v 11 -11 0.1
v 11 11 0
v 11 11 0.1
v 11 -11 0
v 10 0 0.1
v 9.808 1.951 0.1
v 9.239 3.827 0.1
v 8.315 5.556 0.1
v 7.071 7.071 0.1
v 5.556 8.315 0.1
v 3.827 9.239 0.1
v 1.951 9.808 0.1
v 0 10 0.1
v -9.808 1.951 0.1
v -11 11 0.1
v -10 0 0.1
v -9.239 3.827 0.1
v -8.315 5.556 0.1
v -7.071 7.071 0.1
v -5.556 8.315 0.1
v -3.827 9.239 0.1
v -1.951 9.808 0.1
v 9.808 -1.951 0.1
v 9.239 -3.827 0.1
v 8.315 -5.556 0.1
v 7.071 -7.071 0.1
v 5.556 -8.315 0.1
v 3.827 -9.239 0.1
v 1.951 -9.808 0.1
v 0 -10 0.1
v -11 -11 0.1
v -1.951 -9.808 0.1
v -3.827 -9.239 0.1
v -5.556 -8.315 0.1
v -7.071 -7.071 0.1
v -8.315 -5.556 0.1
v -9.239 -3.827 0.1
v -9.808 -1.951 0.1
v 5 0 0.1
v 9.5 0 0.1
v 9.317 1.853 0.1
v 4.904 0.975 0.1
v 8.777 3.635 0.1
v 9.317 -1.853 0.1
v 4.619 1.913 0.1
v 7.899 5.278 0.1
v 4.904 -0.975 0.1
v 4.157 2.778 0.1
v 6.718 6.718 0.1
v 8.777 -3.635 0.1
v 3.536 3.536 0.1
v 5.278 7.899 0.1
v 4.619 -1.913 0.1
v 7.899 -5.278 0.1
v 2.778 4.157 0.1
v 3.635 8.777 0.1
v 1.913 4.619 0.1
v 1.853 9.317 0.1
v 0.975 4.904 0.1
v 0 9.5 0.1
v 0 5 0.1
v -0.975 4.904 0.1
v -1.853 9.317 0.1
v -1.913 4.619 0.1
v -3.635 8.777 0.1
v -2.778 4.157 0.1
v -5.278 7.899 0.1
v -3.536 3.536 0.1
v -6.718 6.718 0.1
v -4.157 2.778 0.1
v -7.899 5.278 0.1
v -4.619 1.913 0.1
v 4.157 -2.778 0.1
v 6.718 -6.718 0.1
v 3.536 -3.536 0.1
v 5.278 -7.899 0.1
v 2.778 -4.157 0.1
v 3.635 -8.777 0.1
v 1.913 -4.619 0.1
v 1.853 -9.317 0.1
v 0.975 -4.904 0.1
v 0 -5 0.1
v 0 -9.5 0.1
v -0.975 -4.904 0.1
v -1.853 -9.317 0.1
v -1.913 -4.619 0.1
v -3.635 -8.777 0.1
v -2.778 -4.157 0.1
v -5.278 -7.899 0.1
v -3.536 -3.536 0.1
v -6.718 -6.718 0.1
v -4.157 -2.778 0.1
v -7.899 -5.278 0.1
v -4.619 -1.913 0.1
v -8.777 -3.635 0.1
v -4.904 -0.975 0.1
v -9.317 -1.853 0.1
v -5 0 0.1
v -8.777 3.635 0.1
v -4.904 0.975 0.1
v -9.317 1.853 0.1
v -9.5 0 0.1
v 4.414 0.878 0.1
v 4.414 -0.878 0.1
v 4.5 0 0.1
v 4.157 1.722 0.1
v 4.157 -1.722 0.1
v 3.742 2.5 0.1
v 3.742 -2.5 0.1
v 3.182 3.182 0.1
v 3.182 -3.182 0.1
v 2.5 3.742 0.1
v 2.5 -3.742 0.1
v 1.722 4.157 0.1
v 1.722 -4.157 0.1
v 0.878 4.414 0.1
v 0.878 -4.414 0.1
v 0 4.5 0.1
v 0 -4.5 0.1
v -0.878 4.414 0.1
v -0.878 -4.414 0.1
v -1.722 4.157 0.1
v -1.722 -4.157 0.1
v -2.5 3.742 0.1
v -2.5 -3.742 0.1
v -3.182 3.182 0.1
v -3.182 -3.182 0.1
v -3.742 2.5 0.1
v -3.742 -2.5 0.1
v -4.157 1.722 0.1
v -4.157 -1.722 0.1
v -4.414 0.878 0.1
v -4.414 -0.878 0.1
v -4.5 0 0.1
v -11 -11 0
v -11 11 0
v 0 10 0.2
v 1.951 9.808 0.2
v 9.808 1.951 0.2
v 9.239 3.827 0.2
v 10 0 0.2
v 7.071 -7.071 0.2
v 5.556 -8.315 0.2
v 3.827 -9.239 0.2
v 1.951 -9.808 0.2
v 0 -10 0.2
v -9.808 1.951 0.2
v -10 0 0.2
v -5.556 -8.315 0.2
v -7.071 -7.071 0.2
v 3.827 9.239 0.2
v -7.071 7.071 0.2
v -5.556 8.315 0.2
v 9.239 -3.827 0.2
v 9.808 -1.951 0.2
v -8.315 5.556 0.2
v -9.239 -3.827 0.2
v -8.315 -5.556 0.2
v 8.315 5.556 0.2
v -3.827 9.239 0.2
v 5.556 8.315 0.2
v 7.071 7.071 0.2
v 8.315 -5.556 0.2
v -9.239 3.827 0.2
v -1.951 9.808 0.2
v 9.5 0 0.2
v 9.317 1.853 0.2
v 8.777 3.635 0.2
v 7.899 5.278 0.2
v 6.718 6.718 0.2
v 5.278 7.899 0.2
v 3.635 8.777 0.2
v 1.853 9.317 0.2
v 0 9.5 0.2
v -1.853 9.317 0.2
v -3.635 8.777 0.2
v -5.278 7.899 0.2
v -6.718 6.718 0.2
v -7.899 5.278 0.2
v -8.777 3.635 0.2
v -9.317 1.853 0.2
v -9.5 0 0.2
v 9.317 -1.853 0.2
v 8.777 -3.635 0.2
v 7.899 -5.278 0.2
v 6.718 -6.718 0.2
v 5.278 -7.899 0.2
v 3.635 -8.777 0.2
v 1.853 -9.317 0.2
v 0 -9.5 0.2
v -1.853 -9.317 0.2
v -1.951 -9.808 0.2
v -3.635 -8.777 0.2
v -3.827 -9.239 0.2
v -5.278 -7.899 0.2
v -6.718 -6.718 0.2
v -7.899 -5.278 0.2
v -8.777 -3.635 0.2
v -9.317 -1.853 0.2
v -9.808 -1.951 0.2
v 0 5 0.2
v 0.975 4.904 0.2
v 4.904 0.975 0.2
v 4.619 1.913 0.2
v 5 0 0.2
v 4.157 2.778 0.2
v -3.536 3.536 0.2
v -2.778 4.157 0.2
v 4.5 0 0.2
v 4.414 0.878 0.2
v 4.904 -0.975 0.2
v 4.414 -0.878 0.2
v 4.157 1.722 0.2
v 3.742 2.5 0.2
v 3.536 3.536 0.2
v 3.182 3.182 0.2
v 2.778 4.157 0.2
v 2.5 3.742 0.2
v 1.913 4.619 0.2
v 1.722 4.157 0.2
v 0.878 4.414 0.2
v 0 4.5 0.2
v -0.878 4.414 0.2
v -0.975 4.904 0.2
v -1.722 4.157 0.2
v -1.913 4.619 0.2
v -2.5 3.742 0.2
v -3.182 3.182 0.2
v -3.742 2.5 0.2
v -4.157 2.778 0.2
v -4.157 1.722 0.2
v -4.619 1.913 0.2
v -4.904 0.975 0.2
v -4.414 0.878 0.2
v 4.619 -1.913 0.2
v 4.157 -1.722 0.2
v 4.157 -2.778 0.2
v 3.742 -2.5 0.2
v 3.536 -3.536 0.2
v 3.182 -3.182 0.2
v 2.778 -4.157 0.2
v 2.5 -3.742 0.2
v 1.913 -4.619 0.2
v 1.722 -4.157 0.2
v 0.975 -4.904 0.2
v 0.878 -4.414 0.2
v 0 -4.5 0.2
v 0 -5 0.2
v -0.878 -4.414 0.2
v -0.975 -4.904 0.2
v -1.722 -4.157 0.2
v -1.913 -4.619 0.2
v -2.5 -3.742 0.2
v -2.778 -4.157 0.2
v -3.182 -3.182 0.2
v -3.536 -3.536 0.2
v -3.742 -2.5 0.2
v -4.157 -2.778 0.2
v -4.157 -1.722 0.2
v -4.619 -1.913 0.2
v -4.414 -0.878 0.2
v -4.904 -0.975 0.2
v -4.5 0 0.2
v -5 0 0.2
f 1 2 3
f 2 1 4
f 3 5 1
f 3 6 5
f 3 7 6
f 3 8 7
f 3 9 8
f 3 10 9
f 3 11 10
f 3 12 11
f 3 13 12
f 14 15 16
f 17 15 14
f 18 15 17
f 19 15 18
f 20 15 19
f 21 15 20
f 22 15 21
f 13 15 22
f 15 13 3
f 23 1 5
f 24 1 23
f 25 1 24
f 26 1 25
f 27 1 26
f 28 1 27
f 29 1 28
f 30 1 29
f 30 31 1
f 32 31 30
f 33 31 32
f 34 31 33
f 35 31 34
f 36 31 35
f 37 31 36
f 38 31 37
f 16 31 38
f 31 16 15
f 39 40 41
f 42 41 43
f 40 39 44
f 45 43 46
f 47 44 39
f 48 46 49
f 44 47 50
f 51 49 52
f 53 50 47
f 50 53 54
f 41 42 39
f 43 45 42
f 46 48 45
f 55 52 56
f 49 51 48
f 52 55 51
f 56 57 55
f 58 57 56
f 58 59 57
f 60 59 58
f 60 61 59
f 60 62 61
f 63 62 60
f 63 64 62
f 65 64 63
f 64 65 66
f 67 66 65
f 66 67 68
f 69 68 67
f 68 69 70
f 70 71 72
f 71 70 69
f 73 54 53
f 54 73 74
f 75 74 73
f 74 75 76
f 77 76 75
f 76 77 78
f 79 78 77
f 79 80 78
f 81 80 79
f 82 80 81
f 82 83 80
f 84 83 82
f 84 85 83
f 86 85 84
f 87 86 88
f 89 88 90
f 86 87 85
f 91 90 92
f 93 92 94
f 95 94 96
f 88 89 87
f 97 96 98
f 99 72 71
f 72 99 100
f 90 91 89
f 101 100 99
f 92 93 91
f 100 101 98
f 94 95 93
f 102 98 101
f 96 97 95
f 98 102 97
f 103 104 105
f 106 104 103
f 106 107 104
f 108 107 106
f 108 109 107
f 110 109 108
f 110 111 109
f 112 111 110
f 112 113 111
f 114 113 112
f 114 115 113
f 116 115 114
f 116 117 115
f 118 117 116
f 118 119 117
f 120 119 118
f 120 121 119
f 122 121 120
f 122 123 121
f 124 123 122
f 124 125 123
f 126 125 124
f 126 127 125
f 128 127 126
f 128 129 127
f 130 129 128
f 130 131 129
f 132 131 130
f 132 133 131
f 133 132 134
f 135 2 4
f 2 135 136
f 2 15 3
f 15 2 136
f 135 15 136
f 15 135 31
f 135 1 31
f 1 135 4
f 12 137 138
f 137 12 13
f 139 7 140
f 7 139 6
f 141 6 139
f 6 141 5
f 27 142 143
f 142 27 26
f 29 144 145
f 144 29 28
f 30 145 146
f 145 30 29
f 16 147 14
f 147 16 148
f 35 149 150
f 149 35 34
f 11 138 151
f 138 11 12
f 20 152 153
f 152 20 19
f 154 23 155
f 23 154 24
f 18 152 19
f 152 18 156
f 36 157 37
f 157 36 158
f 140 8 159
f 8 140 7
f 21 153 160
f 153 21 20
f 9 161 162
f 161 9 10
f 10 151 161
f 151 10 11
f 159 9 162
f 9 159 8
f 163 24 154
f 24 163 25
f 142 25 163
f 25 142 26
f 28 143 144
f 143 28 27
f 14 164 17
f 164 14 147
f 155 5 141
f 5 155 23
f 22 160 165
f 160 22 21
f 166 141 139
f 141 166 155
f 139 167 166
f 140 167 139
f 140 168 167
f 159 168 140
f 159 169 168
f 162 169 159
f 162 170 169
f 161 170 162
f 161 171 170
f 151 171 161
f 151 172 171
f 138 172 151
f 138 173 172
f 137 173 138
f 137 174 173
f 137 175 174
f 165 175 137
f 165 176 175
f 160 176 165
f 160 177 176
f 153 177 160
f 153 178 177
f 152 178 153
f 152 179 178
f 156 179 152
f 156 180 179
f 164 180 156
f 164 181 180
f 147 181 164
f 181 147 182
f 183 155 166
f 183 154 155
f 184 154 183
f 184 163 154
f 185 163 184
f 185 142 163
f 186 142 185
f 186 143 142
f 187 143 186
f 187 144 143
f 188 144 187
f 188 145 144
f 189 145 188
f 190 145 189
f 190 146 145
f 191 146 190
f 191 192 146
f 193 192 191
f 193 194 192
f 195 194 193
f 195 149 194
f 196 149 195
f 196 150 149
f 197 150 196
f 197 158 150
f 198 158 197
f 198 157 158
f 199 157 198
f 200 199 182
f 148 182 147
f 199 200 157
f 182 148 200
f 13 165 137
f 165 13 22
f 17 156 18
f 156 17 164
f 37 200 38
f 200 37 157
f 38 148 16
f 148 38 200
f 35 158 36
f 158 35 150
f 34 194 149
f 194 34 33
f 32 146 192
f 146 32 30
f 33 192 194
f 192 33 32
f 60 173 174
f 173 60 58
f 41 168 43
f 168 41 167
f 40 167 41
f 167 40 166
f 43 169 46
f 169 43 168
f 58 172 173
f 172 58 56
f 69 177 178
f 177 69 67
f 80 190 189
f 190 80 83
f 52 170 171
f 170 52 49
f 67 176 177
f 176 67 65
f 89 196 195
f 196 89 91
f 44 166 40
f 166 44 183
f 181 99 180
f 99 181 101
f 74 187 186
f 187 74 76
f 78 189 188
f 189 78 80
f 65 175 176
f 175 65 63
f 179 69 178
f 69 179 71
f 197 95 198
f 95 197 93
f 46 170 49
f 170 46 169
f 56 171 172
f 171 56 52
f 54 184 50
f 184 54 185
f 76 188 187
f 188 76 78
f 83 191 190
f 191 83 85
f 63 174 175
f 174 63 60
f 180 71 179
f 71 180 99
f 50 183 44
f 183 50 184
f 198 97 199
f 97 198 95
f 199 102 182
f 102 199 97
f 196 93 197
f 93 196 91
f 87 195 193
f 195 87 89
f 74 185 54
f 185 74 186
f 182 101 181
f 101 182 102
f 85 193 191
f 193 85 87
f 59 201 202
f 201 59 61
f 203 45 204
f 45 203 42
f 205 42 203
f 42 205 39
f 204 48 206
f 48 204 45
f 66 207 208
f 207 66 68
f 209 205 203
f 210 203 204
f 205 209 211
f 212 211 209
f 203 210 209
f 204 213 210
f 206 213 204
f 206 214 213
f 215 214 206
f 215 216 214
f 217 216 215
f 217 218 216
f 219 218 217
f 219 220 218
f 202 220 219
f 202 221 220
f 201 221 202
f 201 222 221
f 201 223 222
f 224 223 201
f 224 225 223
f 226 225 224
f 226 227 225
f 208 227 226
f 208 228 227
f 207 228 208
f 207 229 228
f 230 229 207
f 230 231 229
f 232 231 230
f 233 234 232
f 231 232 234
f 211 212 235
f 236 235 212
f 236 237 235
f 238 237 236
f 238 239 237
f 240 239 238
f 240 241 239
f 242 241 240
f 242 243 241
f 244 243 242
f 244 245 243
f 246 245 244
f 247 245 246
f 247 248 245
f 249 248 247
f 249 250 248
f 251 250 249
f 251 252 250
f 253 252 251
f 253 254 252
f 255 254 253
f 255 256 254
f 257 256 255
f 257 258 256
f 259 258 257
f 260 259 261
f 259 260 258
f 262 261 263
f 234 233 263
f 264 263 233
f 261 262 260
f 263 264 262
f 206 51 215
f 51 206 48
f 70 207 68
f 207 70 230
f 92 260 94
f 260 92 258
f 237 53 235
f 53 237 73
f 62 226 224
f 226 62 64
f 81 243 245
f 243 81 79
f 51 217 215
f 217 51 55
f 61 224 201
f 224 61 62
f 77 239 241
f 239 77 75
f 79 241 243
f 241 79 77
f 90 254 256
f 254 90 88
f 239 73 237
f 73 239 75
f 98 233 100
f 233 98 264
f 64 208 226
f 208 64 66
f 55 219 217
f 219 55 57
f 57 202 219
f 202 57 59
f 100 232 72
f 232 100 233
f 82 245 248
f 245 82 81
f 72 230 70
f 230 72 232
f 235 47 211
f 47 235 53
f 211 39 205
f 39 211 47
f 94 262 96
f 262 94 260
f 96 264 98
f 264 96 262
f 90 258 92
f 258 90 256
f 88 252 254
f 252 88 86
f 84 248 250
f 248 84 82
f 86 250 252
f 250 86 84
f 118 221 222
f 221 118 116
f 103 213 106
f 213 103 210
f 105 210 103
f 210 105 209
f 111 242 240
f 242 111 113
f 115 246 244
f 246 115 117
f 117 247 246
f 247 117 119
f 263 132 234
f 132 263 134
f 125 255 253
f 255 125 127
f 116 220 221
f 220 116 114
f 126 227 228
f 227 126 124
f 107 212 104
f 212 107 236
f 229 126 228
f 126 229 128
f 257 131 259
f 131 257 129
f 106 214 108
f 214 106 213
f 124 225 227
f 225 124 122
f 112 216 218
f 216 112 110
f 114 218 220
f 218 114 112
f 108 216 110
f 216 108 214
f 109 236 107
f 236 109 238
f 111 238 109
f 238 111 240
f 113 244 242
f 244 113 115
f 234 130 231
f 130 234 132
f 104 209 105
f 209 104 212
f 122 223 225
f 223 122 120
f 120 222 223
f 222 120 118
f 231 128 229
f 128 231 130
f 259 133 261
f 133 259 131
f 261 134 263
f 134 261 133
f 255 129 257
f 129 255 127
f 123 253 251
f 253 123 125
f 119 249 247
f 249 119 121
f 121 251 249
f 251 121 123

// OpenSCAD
$fn=32;
border=1;
outR = 10;
outT = 0.5;

R1 = 5;
th = 0.2;

module cir(r,t)
{
difference()
{
	cylinder(th,r,r);
	cylinder(th,r-t, r-t);
}
}

for (q=[0:90:360])
rotate([0,0,q])
cube([outR+border,outR+border,0.1]);

cir(outR,outT);
cir(R1,outT);

/*
for (i=[1:6])
	for (rot=[0:60/(i):360])
		rotate([0,0,rot])
		{
			union() {
				translate([i*5+2.5,0,0])
					cylinder(1,1.5,1.5);
				translate([i*5,-0.5,0])
					cube([8,1,1]);
			}
		}
*/
